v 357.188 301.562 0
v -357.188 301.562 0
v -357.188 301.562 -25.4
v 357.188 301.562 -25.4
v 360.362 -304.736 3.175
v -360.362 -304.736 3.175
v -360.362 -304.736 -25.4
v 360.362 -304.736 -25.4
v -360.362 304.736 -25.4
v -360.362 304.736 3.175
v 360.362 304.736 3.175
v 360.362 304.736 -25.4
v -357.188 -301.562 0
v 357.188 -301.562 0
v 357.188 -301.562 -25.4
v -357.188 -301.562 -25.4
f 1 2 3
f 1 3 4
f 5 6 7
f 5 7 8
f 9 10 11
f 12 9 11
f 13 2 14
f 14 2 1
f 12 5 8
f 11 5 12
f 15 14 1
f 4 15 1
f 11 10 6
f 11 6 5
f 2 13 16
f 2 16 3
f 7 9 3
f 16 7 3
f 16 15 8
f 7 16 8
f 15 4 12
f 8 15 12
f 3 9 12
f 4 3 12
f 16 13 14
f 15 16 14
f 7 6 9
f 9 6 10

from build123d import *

# Parameters (mm, degrees)
F0_W     = 714.375
F0_H     = 603.123
F1_DEPTH = 3.175
F2_W     = 720.725
F2_H     = 609.473
F2_W_2   = 714.375
F2_H_2   = 603.123
F3_DEPTH = 28.575


with BuildPart() as f1:
    # F0 (on Top) → F1 (new body)
    with BuildSketch(Plane.XY):
        Rectangle(F0_W, F0_H)
    extrude(amount=F1_DEPTH)

    # F2 (on face) → F3 (join)
    with BuildSketch(Plane.XY.offset(3.175)):
        Rectangle(F2_W, F2_H)
        Rectangle(F2_W_2, F2_H_2, mode=Mode.SUBTRACT)
    extrude(amount=-F3_DEPTH)


solid = f1.part
